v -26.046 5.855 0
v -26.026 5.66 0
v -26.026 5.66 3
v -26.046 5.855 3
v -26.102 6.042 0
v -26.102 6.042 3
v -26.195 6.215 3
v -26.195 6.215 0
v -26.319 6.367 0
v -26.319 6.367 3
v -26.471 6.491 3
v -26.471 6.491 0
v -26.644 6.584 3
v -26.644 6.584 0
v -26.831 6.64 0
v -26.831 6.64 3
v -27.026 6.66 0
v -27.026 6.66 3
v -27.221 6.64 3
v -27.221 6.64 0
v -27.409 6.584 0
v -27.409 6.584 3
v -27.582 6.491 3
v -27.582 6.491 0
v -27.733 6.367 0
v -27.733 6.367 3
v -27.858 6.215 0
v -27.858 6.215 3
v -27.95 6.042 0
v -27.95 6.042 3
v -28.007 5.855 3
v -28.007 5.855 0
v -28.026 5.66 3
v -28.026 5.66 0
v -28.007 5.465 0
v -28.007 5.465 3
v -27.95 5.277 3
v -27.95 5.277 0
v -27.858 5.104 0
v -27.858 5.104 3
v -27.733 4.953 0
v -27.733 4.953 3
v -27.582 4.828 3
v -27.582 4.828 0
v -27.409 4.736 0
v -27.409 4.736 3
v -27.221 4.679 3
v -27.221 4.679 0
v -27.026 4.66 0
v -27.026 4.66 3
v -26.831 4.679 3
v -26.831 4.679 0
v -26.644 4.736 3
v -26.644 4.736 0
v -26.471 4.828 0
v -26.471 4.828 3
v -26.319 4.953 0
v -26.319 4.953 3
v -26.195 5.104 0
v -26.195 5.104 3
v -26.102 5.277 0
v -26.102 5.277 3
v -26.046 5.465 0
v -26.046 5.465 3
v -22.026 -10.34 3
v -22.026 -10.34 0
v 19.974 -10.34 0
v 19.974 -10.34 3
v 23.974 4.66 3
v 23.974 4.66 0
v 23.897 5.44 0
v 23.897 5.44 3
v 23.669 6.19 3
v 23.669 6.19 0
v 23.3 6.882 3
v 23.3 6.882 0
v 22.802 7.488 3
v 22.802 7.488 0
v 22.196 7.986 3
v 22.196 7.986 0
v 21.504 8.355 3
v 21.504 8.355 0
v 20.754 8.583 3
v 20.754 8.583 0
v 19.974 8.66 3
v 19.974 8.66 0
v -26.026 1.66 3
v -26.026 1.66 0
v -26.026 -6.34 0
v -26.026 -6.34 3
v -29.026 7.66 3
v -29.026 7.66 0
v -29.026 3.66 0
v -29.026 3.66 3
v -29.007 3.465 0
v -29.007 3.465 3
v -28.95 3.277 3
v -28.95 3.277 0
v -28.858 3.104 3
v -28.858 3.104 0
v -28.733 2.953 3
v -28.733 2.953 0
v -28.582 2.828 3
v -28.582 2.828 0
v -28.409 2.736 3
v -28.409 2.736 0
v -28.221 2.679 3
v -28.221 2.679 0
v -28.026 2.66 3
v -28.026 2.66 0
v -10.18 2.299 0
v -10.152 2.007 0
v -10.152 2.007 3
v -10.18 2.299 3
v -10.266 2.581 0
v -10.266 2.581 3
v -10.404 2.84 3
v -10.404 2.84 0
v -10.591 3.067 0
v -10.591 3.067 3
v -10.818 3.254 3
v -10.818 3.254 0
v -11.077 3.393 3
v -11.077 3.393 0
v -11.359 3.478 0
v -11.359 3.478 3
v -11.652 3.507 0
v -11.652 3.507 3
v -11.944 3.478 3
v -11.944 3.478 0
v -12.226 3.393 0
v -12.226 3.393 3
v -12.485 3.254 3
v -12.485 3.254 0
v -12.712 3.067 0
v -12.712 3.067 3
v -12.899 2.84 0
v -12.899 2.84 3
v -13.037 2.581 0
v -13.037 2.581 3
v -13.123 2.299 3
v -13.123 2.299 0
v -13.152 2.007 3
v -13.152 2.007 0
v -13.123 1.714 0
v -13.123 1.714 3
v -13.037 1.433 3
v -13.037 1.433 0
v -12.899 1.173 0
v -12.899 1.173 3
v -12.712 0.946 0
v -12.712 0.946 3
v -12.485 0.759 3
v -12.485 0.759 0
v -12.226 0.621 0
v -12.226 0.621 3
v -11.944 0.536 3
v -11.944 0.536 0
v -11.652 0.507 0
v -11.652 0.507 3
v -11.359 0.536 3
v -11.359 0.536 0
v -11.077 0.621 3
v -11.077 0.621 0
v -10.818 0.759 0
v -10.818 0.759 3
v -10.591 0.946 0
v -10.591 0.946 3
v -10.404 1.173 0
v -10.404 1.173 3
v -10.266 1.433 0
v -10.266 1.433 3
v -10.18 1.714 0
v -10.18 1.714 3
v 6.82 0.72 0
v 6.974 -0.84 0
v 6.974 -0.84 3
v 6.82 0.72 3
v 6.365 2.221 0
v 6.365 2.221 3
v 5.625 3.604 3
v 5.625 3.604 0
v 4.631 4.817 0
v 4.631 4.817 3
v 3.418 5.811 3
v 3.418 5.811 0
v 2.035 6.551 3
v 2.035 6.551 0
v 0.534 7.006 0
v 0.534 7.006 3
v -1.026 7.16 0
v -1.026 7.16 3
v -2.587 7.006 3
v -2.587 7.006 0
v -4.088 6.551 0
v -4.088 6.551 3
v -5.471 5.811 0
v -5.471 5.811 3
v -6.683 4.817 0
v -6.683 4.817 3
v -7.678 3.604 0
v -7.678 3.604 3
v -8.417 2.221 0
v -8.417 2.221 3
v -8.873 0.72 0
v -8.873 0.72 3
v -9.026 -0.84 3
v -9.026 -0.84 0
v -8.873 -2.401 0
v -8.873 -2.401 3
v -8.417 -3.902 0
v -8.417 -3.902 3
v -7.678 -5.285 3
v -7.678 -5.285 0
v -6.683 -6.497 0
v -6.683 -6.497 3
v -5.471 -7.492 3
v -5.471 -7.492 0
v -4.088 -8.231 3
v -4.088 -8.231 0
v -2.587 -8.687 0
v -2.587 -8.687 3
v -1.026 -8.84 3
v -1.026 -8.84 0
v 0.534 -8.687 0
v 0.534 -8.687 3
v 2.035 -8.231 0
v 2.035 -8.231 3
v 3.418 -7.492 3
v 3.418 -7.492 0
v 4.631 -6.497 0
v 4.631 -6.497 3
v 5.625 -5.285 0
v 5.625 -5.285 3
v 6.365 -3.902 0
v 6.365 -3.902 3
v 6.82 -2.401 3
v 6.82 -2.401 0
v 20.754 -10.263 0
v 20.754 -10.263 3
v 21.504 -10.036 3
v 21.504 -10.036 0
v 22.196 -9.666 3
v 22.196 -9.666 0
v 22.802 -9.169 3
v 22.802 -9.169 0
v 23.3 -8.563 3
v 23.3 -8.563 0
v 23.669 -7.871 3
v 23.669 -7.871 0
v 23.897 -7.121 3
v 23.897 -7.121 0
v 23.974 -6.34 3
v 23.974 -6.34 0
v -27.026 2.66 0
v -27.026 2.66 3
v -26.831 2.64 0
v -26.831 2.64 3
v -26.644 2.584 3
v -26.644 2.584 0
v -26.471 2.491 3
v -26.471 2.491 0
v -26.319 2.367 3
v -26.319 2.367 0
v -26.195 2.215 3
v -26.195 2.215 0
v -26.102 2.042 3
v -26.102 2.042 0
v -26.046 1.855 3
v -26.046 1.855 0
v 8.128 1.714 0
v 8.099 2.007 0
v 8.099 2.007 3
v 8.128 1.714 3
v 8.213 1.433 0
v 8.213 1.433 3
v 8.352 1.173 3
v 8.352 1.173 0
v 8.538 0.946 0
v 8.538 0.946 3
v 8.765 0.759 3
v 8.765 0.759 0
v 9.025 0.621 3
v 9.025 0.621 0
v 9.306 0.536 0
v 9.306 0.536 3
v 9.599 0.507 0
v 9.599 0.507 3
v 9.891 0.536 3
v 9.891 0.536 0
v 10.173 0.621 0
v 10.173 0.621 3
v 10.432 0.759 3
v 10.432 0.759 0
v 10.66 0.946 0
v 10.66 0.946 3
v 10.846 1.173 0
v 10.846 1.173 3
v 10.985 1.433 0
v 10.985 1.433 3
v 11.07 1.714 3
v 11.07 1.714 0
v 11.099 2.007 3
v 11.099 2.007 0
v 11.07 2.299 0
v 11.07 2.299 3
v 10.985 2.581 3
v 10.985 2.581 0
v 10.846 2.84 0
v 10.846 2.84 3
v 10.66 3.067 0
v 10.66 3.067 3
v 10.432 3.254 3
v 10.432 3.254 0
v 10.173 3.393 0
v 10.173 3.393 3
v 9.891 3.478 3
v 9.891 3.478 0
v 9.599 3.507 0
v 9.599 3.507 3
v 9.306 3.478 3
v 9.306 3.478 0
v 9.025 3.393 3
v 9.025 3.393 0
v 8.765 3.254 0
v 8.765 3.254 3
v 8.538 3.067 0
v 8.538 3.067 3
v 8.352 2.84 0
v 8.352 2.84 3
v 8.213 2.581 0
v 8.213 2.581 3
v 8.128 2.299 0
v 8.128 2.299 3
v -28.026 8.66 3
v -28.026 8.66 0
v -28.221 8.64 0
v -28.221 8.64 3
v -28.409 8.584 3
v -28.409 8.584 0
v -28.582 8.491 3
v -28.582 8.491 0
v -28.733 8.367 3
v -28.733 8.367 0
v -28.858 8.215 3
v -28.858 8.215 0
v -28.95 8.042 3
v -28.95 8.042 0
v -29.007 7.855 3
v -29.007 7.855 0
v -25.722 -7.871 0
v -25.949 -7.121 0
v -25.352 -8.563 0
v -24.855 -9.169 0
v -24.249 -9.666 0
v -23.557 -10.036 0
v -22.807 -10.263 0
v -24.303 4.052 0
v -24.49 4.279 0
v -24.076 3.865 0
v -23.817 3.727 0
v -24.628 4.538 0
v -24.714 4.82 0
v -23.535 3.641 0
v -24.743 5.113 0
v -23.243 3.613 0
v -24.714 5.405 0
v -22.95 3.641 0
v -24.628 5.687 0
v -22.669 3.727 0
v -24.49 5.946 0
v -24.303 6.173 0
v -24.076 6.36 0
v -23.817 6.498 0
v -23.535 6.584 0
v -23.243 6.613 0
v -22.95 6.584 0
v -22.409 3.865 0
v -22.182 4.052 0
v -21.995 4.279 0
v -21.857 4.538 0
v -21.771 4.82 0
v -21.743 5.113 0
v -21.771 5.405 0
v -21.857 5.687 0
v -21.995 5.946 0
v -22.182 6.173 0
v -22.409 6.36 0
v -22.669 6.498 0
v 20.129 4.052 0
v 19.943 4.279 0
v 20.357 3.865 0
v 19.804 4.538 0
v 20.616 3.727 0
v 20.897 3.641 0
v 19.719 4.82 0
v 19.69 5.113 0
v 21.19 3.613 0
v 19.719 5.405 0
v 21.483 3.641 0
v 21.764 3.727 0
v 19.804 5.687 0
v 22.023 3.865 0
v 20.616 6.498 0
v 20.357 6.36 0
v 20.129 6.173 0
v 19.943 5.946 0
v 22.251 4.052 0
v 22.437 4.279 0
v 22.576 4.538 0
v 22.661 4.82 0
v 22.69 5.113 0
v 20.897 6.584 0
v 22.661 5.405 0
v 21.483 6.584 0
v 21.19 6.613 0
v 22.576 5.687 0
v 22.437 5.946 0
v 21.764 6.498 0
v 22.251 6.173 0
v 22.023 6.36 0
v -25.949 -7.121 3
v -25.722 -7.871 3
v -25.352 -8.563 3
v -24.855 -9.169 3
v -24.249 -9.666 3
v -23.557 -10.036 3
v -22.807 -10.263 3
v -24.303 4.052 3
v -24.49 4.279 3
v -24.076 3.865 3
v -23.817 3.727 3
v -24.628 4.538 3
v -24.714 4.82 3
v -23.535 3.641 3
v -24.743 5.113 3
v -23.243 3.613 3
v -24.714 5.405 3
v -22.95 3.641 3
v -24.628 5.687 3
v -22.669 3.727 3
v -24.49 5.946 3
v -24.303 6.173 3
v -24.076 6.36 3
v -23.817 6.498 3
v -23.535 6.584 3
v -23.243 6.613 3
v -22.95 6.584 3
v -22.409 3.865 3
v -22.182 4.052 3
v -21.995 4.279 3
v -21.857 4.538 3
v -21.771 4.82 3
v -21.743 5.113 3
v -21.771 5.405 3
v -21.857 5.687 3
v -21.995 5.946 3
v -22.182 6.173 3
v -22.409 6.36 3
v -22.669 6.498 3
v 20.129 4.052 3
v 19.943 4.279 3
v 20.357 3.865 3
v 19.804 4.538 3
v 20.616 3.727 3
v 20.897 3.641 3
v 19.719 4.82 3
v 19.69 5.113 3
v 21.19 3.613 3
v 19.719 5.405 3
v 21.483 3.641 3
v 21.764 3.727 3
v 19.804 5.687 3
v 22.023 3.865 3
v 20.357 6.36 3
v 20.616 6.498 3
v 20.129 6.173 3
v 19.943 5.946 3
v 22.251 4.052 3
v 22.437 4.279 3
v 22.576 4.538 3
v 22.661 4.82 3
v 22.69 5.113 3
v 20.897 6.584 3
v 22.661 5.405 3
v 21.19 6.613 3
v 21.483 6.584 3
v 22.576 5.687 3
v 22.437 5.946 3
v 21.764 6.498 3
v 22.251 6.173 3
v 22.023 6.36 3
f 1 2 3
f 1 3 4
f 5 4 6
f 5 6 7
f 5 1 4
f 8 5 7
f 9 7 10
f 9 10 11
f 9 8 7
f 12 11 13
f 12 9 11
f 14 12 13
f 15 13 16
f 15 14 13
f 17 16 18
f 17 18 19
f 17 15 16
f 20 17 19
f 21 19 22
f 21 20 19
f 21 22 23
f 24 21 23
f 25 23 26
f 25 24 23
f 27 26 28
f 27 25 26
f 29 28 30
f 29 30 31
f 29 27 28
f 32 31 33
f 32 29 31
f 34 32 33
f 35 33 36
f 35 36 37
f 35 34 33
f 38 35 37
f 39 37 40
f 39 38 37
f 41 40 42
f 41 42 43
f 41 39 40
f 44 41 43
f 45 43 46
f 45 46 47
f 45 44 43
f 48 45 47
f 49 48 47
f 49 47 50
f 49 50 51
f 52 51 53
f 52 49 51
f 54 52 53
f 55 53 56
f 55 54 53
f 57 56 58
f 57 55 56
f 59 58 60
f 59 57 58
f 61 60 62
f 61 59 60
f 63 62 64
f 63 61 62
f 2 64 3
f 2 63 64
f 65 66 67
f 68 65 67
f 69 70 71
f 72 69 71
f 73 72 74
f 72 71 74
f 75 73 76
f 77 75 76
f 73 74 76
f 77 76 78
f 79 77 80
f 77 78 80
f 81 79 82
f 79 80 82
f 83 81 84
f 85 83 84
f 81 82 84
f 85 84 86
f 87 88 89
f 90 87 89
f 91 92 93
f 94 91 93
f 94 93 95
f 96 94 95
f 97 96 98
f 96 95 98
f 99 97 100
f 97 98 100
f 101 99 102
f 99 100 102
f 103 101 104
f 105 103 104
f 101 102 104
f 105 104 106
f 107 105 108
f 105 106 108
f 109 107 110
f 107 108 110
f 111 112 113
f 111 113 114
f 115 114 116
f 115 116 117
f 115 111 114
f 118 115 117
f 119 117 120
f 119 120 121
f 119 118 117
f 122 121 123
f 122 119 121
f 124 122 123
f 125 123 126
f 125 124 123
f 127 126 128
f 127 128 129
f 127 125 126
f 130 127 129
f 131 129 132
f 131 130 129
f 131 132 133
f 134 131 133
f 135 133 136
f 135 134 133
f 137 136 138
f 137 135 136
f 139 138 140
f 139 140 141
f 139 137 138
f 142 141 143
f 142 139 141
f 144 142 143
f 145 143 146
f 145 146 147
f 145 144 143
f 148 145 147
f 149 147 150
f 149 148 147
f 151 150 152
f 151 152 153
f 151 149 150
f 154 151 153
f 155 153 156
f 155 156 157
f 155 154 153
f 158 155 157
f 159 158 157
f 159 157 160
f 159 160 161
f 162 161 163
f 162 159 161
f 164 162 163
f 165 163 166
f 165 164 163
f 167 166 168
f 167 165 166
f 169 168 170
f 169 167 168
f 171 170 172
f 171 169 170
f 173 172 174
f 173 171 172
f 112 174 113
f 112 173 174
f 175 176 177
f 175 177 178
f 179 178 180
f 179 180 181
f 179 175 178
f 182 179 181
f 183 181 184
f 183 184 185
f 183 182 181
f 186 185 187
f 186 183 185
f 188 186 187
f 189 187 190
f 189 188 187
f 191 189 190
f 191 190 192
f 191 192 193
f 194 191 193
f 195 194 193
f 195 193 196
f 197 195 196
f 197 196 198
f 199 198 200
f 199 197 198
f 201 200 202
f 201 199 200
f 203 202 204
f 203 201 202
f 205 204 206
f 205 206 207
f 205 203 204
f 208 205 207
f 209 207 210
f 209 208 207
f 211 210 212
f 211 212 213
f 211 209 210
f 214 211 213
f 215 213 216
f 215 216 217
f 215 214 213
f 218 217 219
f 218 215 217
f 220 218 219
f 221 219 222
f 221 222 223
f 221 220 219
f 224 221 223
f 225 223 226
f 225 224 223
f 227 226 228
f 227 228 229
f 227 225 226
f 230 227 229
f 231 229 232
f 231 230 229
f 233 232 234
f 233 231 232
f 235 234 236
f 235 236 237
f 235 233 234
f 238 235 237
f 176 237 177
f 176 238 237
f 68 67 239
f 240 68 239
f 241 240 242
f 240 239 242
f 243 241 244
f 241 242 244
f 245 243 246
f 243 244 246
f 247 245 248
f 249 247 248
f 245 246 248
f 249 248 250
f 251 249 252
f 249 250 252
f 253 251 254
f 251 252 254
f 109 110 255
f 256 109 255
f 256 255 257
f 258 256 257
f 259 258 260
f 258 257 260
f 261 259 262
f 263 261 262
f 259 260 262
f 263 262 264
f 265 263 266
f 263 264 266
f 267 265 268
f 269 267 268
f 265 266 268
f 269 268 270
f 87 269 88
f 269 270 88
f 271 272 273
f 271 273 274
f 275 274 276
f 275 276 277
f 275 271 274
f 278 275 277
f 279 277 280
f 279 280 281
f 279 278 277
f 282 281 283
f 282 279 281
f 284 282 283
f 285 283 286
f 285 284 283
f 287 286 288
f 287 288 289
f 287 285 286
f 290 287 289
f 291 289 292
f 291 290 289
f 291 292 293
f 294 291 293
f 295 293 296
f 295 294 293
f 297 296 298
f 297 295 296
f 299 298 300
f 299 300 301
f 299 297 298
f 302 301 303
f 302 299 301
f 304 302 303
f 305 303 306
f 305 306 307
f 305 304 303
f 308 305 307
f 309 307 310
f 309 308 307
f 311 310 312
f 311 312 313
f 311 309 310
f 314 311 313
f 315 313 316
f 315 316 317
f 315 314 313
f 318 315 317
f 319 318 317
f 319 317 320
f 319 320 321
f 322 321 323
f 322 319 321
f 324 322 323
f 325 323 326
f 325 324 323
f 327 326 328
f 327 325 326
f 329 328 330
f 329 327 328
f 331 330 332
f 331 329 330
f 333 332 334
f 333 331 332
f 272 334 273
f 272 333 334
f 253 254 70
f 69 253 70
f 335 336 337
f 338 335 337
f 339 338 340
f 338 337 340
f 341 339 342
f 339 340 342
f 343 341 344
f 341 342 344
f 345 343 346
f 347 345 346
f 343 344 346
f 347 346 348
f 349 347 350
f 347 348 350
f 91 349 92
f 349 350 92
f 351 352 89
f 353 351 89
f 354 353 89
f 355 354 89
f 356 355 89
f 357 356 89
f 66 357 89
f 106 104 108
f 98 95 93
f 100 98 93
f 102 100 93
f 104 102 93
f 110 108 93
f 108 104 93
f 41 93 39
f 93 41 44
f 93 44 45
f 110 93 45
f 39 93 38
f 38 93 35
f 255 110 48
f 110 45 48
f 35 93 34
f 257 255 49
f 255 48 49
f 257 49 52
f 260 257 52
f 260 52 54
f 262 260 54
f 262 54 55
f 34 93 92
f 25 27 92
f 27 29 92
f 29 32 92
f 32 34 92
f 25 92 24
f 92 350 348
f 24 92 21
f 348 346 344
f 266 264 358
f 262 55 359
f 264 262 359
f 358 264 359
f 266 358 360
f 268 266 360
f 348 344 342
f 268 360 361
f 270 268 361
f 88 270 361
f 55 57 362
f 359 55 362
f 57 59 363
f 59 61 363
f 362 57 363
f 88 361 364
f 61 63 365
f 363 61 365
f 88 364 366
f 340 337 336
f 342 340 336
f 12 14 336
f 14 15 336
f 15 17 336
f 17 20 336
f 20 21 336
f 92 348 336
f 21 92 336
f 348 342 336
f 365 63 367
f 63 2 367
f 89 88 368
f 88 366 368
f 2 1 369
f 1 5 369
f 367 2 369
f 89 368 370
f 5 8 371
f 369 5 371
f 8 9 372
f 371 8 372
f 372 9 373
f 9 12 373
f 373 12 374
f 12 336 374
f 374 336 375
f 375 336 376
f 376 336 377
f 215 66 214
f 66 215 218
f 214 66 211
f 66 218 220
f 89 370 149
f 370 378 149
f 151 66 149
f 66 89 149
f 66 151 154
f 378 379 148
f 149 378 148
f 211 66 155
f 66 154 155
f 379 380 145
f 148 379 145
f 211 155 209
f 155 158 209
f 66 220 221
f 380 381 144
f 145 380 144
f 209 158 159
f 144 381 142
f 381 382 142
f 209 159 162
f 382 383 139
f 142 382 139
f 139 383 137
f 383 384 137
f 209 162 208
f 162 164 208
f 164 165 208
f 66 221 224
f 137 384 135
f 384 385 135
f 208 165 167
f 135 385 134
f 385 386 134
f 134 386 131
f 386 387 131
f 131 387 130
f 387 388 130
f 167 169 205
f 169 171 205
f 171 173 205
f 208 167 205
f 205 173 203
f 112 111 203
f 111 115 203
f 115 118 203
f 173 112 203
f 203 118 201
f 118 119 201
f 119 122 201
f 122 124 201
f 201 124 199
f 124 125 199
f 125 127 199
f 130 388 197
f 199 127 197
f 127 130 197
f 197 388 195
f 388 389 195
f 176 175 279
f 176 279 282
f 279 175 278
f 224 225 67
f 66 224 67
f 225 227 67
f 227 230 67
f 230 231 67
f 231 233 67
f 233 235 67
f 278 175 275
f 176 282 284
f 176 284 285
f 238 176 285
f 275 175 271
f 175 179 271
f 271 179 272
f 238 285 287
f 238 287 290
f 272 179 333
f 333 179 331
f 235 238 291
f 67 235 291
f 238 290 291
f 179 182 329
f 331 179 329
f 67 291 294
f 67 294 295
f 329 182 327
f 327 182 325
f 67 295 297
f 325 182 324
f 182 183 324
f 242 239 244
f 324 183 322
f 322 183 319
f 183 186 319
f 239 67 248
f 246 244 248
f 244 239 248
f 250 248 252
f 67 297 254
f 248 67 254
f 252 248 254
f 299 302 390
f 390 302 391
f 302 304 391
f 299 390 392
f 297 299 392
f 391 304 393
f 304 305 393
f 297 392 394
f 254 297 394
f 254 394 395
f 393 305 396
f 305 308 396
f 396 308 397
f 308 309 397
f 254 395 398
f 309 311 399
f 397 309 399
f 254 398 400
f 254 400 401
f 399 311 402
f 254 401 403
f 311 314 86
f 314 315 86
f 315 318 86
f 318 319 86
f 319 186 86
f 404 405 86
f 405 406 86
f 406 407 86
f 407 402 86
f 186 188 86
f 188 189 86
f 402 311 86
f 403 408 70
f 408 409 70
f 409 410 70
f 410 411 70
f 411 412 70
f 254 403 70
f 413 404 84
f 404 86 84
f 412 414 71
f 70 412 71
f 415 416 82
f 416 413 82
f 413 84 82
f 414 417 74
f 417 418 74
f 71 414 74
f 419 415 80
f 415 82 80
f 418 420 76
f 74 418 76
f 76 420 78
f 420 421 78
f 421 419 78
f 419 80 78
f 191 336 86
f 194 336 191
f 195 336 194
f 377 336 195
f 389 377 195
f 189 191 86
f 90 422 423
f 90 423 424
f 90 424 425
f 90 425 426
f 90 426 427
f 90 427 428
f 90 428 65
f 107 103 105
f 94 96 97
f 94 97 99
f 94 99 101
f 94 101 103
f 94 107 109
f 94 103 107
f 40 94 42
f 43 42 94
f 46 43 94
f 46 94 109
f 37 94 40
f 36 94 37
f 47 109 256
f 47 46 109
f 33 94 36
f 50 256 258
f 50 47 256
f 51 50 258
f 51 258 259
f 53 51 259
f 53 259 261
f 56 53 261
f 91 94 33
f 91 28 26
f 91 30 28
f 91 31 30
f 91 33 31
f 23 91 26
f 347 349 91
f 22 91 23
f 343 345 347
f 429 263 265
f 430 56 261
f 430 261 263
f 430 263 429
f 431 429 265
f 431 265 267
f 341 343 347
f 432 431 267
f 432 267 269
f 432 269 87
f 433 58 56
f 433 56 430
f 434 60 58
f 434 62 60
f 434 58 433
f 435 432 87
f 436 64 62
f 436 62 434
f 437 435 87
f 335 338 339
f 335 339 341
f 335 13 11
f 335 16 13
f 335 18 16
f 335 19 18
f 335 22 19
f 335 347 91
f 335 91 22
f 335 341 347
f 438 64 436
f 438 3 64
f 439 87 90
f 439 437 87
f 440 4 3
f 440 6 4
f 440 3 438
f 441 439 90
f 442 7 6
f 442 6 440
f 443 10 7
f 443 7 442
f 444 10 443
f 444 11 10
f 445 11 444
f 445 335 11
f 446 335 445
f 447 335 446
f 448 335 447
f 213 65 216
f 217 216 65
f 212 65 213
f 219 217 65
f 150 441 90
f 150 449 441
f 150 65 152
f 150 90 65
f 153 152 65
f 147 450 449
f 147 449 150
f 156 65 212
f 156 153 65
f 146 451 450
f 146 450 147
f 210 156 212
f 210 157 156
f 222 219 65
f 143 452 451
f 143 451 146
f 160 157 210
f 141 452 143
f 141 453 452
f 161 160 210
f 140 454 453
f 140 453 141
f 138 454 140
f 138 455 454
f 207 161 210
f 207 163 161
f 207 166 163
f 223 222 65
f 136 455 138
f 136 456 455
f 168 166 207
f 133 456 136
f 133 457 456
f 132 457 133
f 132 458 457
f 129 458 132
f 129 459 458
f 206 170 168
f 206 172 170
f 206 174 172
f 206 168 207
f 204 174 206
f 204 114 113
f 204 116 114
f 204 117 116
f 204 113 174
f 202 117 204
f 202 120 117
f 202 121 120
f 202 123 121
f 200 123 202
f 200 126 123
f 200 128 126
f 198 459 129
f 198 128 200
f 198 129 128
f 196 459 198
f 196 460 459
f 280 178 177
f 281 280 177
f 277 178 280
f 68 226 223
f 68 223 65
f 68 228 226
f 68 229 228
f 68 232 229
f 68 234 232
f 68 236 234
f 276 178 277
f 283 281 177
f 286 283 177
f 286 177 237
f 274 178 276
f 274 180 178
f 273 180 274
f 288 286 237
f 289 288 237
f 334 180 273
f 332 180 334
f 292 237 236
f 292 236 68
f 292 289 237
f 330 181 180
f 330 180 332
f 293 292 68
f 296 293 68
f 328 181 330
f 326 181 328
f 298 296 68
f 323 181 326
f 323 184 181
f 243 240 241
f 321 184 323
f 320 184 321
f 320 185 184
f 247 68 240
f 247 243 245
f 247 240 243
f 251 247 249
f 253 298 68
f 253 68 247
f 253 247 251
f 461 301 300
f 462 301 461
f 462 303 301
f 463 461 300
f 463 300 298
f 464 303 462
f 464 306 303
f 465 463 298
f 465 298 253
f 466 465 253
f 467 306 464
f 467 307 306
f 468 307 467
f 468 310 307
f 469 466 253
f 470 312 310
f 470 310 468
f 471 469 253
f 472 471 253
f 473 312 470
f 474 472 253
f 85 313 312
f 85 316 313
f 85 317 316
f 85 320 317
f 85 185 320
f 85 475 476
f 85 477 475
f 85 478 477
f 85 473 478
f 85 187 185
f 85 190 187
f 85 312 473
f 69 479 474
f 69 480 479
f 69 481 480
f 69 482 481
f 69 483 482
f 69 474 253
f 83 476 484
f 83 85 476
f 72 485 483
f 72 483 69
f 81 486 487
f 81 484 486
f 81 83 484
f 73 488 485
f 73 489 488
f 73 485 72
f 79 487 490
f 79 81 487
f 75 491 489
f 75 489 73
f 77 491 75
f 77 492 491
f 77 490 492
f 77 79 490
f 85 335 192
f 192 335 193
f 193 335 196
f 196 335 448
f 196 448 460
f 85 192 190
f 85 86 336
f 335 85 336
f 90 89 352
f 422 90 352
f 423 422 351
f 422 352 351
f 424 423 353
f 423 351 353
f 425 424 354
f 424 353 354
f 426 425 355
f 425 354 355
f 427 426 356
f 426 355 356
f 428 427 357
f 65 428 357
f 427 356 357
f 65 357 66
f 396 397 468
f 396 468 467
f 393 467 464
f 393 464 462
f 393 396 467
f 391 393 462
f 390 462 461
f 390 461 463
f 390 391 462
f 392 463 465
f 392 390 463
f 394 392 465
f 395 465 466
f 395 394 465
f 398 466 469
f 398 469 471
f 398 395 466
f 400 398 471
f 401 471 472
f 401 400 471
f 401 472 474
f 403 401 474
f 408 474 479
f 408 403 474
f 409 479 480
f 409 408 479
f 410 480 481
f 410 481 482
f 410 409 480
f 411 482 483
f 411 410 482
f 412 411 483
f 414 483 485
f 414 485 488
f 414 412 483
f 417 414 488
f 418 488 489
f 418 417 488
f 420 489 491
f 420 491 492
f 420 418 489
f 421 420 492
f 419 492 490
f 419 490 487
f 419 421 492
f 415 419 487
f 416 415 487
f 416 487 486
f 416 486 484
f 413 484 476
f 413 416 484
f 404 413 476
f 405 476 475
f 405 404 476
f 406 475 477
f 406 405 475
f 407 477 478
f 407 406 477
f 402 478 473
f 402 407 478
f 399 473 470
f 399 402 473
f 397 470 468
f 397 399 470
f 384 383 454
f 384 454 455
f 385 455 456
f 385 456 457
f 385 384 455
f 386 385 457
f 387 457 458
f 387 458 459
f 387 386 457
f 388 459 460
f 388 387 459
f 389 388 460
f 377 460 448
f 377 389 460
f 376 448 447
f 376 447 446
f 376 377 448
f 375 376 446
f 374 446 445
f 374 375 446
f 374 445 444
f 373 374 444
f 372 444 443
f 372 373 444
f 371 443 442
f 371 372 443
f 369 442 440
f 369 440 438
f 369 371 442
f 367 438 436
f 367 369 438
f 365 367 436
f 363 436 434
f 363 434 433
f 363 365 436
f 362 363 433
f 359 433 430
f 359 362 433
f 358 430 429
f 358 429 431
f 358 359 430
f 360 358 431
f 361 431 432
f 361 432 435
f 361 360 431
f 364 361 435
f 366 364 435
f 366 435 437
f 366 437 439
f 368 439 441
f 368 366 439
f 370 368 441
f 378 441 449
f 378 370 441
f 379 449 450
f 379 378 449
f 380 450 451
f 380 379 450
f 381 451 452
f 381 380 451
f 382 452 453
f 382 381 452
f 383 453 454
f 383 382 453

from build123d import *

# Parameters (mm, degrees)
SKETCH_1_R      = 8
SKETCH_1_R_2    = 1.5
SKETCH_1_R_3    = 1
EXTRUDE_1_DEPTH = 3


with BuildPart() as part:
    # Эскиз1 → Бобышка-Вытянуть1 (new body)
    with BuildSketch(Plane.XY):
        with BuildLine():
            Line((-22.026334366, -10.340325606), (19.973665634, -10.340325606))
            ThreePointArc((19.973665634, -10.340325606), (22.802092759, -9.168752731), (23.973665634, -6.340325606))
            Line((23.973665634, -6.340325606), (23.973665634, 4.659674394))
            ThreePointArc((23.973665634, 4.659674394), (22.802092759, 7.488101519), (19.973665634, 8.659674394))
            Line((19.973665634, 8.659674394), (-22.026334366, 8.659674394))
            Line((-22.026334366, 8.659674394), (-28.026334366, 8.659674394))
            ThreePointArc((-28.026334366, 8.659674394), (-28.733441147, 8.366781175), (-29.026334366, 7.659674394))
            Line((-29.026334366, 7.659674394), (-29.026334366, 3.659674394))
            ThreePointArc((-29.026334366, 3.659674394), (-28.733441147, 2.952567613), (-28.026334366, 2.659674394))
            Line((-28.026334366, 2.659674394), (-27.026334366, 2.659674394))
            ThreePointArc((-27.026334366, 2.659674394), (-26.319227584, 2.366781175), (-26.026334366, 1.659674394))
            Line((-26.026334366, 1.659674394), (-26.026334366, -6.340325606))
            ThreePointArc((-26.026334366, -6.340325606), (-24.85476149, -9.168752731), (-22.026334366, -10.340325606))
        make_face()
        with Locations((-1.026334366, -0.840325606)):
            Circle(SKETCH_1_R, mode=Mode.SUBTRACT)
        with Locations((-23.24262837, 5.112512431)):
            Circle(SKETCH_1_R_2, mode=Mode.SUBTRACT)
        with Locations((-11.651518455, 2.00668389)):
            Circle(SKETCH_1_R_2, mode=Mode.SUBTRACT)
        with Locations(Location((9.598849724, 2.00668389, 0), (0, 0, 180))):
            Circle(SKETCH_1_R_2, mode=Mode.SUBTRACT)
        with Locations(Location((21.189959639, 5.112512431, 0), (0, 0, 180))):
            Circle(SKETCH_1_R_2, mode=Mode.SUBTRACT)
        with Locations((-27.026334366, 5.659674394)):
            Circle(SKETCH_1_R_3, mode=Mode.SUBTRACT)
    extrude(amount=EXTRUDE_1_DEPTH)


solid = part.part
